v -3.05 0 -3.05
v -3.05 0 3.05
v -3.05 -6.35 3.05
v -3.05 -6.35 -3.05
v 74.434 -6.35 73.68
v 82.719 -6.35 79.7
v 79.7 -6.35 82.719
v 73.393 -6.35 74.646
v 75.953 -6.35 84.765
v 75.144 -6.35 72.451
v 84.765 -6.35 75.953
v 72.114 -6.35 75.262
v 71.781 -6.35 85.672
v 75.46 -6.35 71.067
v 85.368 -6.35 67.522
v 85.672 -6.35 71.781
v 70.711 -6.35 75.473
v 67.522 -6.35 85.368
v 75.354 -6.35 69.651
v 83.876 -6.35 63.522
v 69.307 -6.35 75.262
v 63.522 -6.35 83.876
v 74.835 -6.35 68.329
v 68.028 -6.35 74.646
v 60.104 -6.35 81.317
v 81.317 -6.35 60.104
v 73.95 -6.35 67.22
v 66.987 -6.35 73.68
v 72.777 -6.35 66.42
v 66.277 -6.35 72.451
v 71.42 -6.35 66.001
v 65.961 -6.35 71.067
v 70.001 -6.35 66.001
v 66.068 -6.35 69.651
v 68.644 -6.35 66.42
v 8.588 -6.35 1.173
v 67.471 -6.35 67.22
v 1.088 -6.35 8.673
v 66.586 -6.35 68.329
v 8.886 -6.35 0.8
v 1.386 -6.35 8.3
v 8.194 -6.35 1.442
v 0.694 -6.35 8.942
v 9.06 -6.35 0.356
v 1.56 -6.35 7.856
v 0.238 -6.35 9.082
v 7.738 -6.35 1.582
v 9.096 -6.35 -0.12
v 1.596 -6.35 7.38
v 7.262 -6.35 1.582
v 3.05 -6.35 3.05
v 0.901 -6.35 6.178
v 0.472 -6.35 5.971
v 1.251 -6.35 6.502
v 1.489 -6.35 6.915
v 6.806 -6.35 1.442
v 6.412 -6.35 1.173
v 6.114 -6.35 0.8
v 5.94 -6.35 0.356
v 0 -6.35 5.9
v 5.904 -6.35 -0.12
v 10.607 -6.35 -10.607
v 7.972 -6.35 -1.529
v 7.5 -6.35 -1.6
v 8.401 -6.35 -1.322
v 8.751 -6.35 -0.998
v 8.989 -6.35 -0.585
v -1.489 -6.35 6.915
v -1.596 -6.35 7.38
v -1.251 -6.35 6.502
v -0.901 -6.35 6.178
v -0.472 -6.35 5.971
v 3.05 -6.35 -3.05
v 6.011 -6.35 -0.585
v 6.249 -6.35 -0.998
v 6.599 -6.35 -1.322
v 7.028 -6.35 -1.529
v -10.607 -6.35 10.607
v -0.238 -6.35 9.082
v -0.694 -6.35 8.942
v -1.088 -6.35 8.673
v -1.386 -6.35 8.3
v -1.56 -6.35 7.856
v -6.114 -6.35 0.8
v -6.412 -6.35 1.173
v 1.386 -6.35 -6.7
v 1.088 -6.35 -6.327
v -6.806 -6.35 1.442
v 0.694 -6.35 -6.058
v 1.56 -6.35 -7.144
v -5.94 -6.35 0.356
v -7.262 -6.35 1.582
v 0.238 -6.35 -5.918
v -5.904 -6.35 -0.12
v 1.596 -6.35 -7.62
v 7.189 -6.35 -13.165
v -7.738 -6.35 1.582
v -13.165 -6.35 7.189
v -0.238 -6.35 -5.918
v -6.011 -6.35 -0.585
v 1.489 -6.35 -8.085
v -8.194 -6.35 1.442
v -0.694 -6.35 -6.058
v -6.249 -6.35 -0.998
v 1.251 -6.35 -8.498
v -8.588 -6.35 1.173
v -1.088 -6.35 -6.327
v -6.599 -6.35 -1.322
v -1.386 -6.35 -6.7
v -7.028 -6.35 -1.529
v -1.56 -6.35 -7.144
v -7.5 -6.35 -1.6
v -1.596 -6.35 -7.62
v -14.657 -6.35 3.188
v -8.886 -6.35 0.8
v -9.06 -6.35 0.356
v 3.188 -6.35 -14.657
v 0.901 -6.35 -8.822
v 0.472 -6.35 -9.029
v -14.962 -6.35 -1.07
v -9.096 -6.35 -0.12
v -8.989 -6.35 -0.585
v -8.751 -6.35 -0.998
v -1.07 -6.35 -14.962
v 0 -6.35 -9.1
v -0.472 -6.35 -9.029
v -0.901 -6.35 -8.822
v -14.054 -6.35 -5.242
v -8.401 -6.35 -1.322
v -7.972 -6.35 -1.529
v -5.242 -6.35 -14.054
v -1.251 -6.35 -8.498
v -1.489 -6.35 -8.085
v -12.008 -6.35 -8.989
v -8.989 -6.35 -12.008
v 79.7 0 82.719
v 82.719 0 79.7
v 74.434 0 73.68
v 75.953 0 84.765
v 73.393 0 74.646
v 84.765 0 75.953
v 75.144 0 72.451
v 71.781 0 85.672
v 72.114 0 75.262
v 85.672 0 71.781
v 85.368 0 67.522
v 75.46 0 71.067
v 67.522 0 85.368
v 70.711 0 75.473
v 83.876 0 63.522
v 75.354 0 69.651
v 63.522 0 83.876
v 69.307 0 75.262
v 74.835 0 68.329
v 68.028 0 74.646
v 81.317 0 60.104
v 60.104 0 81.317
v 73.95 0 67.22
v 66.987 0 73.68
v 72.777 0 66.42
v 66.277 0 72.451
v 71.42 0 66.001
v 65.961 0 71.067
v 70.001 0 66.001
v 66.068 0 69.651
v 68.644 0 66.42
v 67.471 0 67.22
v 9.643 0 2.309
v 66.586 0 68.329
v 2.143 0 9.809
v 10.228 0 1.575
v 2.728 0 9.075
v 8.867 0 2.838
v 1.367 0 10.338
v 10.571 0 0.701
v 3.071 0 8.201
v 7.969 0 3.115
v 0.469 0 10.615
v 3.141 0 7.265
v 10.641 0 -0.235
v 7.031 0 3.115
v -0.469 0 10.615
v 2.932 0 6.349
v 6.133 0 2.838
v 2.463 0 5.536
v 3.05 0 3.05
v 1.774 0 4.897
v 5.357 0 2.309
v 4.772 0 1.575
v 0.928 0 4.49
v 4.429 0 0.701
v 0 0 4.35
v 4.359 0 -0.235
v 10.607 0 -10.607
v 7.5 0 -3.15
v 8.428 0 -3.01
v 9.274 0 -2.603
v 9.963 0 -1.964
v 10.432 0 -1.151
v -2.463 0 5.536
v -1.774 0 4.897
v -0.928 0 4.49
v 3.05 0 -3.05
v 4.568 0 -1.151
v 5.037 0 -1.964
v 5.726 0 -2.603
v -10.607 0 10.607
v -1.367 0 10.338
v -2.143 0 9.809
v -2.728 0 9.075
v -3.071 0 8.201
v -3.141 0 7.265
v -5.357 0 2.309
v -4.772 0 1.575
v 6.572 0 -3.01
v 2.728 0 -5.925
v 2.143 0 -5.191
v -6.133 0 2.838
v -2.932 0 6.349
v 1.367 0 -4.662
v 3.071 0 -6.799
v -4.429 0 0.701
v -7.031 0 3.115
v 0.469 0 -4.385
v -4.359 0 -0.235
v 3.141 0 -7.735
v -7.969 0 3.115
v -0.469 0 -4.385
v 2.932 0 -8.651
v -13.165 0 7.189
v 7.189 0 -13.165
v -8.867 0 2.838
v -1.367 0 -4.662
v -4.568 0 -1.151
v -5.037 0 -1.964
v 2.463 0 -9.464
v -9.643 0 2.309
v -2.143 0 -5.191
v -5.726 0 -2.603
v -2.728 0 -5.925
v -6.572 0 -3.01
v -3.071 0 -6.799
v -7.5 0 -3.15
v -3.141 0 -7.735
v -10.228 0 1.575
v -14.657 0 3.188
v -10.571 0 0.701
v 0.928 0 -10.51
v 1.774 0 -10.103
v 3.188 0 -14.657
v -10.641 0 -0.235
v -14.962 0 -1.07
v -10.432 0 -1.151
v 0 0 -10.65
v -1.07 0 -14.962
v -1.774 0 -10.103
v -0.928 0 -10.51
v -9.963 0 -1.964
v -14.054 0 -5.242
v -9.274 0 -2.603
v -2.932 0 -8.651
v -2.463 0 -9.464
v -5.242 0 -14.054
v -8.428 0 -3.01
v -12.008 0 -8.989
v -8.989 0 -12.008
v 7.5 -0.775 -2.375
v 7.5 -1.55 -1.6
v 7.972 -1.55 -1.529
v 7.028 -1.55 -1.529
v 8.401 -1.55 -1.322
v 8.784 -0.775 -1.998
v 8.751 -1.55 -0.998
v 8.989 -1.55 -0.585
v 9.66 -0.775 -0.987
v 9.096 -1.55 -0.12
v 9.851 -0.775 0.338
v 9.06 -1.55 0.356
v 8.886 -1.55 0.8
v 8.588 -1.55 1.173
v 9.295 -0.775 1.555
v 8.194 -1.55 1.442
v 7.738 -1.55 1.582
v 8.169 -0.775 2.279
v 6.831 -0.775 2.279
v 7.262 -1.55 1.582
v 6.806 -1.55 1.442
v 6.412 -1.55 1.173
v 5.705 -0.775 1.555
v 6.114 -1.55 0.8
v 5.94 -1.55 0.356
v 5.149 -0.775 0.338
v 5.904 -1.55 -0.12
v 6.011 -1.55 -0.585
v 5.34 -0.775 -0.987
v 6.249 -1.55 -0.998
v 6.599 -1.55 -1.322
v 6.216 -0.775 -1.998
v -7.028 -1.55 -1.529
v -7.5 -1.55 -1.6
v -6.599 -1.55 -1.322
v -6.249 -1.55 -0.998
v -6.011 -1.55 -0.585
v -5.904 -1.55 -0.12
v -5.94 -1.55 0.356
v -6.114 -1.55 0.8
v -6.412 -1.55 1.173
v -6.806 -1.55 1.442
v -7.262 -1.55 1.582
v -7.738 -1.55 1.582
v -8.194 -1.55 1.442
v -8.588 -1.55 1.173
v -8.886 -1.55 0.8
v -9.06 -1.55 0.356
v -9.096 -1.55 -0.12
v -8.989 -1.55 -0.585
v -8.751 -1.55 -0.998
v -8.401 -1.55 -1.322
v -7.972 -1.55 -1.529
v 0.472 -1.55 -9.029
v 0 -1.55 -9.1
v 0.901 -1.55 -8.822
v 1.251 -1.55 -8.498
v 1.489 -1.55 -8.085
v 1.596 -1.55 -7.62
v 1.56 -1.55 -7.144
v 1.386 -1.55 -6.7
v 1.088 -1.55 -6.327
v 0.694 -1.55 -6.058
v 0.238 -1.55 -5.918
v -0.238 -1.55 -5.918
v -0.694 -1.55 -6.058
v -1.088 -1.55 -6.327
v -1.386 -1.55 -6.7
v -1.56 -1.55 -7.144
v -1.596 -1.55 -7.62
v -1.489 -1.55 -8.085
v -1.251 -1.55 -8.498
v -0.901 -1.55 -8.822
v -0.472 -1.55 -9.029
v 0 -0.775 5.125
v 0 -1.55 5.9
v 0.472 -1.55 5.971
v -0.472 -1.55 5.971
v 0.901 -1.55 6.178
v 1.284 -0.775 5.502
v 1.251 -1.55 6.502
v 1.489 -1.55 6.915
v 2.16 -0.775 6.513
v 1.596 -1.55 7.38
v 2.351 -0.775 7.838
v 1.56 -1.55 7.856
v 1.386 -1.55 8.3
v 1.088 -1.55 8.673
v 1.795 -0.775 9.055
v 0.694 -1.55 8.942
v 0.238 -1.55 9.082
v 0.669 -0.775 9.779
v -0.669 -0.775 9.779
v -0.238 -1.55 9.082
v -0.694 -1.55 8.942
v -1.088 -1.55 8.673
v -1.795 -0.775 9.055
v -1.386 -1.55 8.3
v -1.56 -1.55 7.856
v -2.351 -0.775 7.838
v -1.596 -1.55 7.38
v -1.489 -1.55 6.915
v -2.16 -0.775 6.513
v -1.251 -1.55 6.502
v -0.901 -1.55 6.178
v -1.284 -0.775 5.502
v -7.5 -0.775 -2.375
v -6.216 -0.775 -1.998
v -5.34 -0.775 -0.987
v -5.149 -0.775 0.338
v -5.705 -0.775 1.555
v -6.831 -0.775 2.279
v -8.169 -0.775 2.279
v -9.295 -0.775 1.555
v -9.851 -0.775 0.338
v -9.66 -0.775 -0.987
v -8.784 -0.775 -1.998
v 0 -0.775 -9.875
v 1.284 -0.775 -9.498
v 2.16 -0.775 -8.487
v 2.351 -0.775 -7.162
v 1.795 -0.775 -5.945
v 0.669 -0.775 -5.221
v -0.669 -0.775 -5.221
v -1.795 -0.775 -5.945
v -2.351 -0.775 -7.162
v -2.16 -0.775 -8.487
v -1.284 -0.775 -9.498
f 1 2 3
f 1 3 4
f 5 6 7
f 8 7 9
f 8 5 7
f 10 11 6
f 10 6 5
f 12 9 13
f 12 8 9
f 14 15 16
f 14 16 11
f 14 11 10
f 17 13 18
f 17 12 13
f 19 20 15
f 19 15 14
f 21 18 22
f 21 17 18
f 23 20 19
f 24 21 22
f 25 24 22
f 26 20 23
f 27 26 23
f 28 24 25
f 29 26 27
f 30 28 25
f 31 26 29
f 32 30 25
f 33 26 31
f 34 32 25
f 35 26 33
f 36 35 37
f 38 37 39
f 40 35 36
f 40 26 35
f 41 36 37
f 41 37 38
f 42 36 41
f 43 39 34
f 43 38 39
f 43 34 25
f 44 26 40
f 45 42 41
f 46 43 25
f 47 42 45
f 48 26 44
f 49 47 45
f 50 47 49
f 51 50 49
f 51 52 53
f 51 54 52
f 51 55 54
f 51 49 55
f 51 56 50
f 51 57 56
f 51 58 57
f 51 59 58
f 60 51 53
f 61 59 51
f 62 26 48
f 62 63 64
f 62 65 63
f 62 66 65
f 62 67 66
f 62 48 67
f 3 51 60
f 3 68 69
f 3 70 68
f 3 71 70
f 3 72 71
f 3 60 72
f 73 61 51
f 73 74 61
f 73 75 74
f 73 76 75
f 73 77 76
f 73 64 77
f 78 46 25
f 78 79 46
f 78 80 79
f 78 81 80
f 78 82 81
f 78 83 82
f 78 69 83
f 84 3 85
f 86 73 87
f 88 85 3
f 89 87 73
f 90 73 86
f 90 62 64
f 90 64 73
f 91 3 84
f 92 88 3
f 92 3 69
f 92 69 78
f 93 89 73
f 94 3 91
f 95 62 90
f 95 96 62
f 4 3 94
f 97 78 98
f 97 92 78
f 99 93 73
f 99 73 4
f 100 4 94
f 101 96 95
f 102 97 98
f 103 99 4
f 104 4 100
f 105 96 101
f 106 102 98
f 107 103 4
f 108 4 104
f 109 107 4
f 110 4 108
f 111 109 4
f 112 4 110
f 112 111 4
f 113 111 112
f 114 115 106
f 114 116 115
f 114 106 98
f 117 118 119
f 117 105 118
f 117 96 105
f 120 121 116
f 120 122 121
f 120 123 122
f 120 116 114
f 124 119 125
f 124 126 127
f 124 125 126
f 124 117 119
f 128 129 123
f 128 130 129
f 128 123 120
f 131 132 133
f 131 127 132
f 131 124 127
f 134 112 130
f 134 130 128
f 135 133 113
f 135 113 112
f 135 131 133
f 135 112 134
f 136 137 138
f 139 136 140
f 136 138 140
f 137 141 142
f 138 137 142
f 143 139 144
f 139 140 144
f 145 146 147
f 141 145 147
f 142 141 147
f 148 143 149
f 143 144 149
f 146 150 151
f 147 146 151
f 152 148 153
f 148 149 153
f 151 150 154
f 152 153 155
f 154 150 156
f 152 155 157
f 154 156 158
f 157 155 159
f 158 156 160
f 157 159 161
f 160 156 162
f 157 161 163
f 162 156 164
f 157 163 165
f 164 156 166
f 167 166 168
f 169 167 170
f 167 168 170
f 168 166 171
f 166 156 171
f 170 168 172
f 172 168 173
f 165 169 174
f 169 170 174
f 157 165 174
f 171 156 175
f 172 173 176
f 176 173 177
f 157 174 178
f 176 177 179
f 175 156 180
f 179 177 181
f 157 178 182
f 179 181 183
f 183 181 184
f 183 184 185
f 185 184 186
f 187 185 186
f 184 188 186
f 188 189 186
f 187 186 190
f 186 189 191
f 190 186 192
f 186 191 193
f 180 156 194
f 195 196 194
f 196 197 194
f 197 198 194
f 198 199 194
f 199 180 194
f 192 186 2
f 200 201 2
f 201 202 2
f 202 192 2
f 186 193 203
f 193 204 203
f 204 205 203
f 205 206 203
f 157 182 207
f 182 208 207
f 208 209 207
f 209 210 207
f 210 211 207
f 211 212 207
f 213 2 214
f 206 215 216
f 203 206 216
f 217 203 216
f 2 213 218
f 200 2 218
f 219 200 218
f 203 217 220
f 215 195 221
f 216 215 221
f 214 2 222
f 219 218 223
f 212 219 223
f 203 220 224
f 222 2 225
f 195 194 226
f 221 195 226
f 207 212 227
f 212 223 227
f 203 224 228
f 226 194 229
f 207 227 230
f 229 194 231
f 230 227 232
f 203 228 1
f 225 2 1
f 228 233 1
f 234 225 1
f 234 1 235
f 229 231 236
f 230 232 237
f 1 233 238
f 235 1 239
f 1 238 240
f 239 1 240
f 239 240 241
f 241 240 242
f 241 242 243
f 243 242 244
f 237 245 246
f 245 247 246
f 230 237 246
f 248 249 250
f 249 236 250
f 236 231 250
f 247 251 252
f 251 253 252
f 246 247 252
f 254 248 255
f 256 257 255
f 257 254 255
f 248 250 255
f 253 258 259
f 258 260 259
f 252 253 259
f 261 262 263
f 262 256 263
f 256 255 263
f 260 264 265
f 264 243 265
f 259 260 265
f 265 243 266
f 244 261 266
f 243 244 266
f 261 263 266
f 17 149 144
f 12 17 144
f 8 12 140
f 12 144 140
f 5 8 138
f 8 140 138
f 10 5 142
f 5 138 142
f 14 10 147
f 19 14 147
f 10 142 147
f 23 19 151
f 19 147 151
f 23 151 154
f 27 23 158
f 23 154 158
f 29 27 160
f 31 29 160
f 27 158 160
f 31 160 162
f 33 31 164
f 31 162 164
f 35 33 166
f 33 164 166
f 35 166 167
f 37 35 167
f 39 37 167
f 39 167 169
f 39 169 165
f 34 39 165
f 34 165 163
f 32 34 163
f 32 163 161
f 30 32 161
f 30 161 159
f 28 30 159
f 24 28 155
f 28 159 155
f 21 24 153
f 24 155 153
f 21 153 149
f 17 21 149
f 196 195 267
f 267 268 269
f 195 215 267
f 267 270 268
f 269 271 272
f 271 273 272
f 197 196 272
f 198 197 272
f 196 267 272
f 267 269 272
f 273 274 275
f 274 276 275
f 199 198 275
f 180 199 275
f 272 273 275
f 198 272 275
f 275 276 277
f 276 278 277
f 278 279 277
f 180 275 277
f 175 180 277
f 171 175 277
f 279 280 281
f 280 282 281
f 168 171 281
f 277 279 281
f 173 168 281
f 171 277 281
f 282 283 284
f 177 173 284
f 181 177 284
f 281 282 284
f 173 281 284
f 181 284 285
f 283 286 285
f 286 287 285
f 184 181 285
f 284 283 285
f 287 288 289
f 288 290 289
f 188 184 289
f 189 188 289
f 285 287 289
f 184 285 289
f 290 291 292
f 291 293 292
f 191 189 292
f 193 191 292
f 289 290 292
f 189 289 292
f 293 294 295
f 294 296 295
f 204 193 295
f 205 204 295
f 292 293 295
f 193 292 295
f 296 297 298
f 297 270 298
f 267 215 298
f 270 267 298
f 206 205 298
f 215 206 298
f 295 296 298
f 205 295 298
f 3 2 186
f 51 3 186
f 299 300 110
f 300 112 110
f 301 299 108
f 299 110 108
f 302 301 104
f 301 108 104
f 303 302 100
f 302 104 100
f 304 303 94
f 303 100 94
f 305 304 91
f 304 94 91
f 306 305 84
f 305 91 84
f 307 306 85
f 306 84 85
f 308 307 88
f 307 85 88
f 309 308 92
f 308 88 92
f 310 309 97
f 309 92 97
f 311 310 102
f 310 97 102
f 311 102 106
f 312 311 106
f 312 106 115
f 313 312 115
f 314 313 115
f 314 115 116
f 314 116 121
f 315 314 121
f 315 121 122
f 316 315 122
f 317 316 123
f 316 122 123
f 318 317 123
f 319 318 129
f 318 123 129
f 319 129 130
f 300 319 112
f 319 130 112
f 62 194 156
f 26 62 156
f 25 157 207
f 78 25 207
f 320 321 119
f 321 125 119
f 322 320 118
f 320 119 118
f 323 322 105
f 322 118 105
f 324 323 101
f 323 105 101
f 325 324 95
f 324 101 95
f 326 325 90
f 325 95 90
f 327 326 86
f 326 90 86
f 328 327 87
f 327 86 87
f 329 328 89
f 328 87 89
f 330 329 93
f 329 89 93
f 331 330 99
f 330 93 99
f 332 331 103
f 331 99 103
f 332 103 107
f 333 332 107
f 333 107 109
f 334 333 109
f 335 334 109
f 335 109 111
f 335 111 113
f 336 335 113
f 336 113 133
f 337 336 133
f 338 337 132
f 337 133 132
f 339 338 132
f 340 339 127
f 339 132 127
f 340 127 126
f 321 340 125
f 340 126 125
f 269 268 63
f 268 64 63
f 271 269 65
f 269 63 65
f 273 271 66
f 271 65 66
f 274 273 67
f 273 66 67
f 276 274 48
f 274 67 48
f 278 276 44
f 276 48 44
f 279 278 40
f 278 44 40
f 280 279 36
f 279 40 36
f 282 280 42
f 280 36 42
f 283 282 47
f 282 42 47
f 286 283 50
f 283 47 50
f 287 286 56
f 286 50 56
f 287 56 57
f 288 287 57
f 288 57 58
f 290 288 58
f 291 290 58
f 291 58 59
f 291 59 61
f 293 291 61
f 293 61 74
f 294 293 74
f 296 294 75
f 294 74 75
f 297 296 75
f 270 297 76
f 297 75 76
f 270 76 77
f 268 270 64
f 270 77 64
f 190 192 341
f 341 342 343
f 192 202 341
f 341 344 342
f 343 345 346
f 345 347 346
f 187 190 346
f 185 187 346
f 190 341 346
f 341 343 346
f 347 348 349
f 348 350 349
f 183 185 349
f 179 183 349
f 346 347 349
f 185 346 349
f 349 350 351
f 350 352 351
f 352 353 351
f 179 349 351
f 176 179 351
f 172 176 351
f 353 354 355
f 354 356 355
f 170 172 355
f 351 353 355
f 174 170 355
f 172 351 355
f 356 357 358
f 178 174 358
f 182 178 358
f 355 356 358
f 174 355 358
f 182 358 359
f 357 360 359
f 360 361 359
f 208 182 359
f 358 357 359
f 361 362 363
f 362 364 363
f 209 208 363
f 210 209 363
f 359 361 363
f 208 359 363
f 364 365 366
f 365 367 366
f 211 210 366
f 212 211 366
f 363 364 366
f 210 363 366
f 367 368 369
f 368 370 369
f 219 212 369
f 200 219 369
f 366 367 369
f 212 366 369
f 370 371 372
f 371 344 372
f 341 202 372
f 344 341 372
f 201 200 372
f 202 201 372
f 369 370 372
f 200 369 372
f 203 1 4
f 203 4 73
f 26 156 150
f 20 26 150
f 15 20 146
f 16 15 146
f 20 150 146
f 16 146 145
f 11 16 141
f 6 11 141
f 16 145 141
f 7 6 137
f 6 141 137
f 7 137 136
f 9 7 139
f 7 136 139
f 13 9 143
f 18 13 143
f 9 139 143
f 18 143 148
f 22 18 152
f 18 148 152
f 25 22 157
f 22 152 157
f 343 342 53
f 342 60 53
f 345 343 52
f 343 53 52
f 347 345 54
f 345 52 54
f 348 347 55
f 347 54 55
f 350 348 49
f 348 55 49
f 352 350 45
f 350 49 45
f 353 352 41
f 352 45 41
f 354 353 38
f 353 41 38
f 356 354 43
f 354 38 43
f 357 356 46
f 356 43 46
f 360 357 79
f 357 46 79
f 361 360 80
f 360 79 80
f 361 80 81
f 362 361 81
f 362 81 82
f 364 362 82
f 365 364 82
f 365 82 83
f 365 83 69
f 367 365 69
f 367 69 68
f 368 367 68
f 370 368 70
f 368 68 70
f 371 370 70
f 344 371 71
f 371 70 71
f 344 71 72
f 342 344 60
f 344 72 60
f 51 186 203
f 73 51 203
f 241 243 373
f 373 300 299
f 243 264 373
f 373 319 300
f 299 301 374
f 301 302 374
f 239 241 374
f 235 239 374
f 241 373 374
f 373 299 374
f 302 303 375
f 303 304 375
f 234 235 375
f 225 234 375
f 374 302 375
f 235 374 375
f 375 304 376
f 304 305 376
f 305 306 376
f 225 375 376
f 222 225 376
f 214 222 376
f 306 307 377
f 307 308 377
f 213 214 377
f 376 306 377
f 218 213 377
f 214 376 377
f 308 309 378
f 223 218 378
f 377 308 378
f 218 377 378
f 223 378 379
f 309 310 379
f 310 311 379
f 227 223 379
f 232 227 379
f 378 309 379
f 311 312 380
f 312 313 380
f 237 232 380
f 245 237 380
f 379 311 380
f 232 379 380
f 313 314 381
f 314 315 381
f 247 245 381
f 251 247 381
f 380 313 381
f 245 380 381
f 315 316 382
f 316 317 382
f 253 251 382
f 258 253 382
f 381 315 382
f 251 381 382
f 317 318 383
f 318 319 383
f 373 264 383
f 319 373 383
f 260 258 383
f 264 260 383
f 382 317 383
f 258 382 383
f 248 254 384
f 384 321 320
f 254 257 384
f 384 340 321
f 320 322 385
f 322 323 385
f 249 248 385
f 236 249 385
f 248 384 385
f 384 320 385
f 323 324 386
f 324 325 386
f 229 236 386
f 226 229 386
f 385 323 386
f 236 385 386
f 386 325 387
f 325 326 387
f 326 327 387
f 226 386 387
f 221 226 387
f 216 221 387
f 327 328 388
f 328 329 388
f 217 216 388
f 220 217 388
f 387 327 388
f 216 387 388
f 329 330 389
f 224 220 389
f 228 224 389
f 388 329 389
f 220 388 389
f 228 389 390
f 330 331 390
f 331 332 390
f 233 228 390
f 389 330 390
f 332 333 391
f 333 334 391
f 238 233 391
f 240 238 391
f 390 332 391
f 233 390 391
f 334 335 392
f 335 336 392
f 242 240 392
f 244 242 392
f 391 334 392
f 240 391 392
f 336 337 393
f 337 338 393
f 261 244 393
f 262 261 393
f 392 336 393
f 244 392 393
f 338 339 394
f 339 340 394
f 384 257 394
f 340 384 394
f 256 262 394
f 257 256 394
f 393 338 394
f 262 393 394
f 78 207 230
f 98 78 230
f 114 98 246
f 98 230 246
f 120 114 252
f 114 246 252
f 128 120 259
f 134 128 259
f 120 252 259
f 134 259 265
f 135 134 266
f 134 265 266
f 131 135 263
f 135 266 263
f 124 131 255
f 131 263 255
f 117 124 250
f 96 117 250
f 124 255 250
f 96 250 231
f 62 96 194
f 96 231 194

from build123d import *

# Parameters (mm, degrees)
SKETCH2_R                                       = 4.7625
SKETCH2_W                                       = 6.1
SKETCH2_H                                       = 6.1
BOSS_EXTRUDE1_DEPTH                             = 6.35
CSK_FOR_M3_FLAT_HEAD_MACHINE_SCREW1_D           = 3.2
CSK_FOR_M3_FLAT_HEAD_MACHINE_SCREW1_CSINK_D     = 6.3
CSK_FOR_M3_FLAT_HEAD_MACHINE_SCREW1_CSINK_ANGLE = 90


with BuildPart() as part:
    # Sketch2 → Boss-Extrude1 (new body)
    with BuildSketch(Plane(origin=(0, 0, 0), x_dir=(1, 0, 0), z_dir=(0, 1, 0))):
        with BuildLine():
            Line((10.606601718, 10.606601718), (81.317279836, -60.104076401))
            ThreePointArc((81.317279836, -60.104076401), (81.317279836, -81.317279836), (60.104076401, -81.317279836))
            Line((60.104076401, -81.317279836), (-10.606601718, -10.606601718))
            ThreePointArc((-10.606601718, -10.606601718), (-10.606601718, 10.606601718), (10.606601718, 10.606601718))
        make_face()
        with Locations(Location((70.710678119, -70.710678119, 0), (0, 0, 270))):
            Circle(SKETCH2_R, mode=Mode.SUBTRACT)
        Rectangle(SKETCH2_W, SKETCH2_H, mode=Mode.SUBTRACT)
    extrude(amount=-BOSS_EXTRUDE1_DEPTH)

    # CSK for M3 Flat Head Machine Screw1 (through all)
    with Locations(Plane(origin=(0, 0, -7.5), x_dir=(0, 0, 1), z_dir=(0, 1, 0))):
        with Locations((0, 0), (7.5, -7.5), (7.5, 7.5), (15, 0)):
            CounterSinkHole(CSK_FOR_M3_FLAT_HEAD_MACHINE_SCREW1_D / 2, CSK_FOR_M3_FLAT_HEAD_MACHINE_SCREW1_CSINK_D / 2, counter_sink_angle=CSK_FOR_M3_FLAT_HEAD_MACHINE_SCREW1_CSINK_ANGLE)


solid = part.part
